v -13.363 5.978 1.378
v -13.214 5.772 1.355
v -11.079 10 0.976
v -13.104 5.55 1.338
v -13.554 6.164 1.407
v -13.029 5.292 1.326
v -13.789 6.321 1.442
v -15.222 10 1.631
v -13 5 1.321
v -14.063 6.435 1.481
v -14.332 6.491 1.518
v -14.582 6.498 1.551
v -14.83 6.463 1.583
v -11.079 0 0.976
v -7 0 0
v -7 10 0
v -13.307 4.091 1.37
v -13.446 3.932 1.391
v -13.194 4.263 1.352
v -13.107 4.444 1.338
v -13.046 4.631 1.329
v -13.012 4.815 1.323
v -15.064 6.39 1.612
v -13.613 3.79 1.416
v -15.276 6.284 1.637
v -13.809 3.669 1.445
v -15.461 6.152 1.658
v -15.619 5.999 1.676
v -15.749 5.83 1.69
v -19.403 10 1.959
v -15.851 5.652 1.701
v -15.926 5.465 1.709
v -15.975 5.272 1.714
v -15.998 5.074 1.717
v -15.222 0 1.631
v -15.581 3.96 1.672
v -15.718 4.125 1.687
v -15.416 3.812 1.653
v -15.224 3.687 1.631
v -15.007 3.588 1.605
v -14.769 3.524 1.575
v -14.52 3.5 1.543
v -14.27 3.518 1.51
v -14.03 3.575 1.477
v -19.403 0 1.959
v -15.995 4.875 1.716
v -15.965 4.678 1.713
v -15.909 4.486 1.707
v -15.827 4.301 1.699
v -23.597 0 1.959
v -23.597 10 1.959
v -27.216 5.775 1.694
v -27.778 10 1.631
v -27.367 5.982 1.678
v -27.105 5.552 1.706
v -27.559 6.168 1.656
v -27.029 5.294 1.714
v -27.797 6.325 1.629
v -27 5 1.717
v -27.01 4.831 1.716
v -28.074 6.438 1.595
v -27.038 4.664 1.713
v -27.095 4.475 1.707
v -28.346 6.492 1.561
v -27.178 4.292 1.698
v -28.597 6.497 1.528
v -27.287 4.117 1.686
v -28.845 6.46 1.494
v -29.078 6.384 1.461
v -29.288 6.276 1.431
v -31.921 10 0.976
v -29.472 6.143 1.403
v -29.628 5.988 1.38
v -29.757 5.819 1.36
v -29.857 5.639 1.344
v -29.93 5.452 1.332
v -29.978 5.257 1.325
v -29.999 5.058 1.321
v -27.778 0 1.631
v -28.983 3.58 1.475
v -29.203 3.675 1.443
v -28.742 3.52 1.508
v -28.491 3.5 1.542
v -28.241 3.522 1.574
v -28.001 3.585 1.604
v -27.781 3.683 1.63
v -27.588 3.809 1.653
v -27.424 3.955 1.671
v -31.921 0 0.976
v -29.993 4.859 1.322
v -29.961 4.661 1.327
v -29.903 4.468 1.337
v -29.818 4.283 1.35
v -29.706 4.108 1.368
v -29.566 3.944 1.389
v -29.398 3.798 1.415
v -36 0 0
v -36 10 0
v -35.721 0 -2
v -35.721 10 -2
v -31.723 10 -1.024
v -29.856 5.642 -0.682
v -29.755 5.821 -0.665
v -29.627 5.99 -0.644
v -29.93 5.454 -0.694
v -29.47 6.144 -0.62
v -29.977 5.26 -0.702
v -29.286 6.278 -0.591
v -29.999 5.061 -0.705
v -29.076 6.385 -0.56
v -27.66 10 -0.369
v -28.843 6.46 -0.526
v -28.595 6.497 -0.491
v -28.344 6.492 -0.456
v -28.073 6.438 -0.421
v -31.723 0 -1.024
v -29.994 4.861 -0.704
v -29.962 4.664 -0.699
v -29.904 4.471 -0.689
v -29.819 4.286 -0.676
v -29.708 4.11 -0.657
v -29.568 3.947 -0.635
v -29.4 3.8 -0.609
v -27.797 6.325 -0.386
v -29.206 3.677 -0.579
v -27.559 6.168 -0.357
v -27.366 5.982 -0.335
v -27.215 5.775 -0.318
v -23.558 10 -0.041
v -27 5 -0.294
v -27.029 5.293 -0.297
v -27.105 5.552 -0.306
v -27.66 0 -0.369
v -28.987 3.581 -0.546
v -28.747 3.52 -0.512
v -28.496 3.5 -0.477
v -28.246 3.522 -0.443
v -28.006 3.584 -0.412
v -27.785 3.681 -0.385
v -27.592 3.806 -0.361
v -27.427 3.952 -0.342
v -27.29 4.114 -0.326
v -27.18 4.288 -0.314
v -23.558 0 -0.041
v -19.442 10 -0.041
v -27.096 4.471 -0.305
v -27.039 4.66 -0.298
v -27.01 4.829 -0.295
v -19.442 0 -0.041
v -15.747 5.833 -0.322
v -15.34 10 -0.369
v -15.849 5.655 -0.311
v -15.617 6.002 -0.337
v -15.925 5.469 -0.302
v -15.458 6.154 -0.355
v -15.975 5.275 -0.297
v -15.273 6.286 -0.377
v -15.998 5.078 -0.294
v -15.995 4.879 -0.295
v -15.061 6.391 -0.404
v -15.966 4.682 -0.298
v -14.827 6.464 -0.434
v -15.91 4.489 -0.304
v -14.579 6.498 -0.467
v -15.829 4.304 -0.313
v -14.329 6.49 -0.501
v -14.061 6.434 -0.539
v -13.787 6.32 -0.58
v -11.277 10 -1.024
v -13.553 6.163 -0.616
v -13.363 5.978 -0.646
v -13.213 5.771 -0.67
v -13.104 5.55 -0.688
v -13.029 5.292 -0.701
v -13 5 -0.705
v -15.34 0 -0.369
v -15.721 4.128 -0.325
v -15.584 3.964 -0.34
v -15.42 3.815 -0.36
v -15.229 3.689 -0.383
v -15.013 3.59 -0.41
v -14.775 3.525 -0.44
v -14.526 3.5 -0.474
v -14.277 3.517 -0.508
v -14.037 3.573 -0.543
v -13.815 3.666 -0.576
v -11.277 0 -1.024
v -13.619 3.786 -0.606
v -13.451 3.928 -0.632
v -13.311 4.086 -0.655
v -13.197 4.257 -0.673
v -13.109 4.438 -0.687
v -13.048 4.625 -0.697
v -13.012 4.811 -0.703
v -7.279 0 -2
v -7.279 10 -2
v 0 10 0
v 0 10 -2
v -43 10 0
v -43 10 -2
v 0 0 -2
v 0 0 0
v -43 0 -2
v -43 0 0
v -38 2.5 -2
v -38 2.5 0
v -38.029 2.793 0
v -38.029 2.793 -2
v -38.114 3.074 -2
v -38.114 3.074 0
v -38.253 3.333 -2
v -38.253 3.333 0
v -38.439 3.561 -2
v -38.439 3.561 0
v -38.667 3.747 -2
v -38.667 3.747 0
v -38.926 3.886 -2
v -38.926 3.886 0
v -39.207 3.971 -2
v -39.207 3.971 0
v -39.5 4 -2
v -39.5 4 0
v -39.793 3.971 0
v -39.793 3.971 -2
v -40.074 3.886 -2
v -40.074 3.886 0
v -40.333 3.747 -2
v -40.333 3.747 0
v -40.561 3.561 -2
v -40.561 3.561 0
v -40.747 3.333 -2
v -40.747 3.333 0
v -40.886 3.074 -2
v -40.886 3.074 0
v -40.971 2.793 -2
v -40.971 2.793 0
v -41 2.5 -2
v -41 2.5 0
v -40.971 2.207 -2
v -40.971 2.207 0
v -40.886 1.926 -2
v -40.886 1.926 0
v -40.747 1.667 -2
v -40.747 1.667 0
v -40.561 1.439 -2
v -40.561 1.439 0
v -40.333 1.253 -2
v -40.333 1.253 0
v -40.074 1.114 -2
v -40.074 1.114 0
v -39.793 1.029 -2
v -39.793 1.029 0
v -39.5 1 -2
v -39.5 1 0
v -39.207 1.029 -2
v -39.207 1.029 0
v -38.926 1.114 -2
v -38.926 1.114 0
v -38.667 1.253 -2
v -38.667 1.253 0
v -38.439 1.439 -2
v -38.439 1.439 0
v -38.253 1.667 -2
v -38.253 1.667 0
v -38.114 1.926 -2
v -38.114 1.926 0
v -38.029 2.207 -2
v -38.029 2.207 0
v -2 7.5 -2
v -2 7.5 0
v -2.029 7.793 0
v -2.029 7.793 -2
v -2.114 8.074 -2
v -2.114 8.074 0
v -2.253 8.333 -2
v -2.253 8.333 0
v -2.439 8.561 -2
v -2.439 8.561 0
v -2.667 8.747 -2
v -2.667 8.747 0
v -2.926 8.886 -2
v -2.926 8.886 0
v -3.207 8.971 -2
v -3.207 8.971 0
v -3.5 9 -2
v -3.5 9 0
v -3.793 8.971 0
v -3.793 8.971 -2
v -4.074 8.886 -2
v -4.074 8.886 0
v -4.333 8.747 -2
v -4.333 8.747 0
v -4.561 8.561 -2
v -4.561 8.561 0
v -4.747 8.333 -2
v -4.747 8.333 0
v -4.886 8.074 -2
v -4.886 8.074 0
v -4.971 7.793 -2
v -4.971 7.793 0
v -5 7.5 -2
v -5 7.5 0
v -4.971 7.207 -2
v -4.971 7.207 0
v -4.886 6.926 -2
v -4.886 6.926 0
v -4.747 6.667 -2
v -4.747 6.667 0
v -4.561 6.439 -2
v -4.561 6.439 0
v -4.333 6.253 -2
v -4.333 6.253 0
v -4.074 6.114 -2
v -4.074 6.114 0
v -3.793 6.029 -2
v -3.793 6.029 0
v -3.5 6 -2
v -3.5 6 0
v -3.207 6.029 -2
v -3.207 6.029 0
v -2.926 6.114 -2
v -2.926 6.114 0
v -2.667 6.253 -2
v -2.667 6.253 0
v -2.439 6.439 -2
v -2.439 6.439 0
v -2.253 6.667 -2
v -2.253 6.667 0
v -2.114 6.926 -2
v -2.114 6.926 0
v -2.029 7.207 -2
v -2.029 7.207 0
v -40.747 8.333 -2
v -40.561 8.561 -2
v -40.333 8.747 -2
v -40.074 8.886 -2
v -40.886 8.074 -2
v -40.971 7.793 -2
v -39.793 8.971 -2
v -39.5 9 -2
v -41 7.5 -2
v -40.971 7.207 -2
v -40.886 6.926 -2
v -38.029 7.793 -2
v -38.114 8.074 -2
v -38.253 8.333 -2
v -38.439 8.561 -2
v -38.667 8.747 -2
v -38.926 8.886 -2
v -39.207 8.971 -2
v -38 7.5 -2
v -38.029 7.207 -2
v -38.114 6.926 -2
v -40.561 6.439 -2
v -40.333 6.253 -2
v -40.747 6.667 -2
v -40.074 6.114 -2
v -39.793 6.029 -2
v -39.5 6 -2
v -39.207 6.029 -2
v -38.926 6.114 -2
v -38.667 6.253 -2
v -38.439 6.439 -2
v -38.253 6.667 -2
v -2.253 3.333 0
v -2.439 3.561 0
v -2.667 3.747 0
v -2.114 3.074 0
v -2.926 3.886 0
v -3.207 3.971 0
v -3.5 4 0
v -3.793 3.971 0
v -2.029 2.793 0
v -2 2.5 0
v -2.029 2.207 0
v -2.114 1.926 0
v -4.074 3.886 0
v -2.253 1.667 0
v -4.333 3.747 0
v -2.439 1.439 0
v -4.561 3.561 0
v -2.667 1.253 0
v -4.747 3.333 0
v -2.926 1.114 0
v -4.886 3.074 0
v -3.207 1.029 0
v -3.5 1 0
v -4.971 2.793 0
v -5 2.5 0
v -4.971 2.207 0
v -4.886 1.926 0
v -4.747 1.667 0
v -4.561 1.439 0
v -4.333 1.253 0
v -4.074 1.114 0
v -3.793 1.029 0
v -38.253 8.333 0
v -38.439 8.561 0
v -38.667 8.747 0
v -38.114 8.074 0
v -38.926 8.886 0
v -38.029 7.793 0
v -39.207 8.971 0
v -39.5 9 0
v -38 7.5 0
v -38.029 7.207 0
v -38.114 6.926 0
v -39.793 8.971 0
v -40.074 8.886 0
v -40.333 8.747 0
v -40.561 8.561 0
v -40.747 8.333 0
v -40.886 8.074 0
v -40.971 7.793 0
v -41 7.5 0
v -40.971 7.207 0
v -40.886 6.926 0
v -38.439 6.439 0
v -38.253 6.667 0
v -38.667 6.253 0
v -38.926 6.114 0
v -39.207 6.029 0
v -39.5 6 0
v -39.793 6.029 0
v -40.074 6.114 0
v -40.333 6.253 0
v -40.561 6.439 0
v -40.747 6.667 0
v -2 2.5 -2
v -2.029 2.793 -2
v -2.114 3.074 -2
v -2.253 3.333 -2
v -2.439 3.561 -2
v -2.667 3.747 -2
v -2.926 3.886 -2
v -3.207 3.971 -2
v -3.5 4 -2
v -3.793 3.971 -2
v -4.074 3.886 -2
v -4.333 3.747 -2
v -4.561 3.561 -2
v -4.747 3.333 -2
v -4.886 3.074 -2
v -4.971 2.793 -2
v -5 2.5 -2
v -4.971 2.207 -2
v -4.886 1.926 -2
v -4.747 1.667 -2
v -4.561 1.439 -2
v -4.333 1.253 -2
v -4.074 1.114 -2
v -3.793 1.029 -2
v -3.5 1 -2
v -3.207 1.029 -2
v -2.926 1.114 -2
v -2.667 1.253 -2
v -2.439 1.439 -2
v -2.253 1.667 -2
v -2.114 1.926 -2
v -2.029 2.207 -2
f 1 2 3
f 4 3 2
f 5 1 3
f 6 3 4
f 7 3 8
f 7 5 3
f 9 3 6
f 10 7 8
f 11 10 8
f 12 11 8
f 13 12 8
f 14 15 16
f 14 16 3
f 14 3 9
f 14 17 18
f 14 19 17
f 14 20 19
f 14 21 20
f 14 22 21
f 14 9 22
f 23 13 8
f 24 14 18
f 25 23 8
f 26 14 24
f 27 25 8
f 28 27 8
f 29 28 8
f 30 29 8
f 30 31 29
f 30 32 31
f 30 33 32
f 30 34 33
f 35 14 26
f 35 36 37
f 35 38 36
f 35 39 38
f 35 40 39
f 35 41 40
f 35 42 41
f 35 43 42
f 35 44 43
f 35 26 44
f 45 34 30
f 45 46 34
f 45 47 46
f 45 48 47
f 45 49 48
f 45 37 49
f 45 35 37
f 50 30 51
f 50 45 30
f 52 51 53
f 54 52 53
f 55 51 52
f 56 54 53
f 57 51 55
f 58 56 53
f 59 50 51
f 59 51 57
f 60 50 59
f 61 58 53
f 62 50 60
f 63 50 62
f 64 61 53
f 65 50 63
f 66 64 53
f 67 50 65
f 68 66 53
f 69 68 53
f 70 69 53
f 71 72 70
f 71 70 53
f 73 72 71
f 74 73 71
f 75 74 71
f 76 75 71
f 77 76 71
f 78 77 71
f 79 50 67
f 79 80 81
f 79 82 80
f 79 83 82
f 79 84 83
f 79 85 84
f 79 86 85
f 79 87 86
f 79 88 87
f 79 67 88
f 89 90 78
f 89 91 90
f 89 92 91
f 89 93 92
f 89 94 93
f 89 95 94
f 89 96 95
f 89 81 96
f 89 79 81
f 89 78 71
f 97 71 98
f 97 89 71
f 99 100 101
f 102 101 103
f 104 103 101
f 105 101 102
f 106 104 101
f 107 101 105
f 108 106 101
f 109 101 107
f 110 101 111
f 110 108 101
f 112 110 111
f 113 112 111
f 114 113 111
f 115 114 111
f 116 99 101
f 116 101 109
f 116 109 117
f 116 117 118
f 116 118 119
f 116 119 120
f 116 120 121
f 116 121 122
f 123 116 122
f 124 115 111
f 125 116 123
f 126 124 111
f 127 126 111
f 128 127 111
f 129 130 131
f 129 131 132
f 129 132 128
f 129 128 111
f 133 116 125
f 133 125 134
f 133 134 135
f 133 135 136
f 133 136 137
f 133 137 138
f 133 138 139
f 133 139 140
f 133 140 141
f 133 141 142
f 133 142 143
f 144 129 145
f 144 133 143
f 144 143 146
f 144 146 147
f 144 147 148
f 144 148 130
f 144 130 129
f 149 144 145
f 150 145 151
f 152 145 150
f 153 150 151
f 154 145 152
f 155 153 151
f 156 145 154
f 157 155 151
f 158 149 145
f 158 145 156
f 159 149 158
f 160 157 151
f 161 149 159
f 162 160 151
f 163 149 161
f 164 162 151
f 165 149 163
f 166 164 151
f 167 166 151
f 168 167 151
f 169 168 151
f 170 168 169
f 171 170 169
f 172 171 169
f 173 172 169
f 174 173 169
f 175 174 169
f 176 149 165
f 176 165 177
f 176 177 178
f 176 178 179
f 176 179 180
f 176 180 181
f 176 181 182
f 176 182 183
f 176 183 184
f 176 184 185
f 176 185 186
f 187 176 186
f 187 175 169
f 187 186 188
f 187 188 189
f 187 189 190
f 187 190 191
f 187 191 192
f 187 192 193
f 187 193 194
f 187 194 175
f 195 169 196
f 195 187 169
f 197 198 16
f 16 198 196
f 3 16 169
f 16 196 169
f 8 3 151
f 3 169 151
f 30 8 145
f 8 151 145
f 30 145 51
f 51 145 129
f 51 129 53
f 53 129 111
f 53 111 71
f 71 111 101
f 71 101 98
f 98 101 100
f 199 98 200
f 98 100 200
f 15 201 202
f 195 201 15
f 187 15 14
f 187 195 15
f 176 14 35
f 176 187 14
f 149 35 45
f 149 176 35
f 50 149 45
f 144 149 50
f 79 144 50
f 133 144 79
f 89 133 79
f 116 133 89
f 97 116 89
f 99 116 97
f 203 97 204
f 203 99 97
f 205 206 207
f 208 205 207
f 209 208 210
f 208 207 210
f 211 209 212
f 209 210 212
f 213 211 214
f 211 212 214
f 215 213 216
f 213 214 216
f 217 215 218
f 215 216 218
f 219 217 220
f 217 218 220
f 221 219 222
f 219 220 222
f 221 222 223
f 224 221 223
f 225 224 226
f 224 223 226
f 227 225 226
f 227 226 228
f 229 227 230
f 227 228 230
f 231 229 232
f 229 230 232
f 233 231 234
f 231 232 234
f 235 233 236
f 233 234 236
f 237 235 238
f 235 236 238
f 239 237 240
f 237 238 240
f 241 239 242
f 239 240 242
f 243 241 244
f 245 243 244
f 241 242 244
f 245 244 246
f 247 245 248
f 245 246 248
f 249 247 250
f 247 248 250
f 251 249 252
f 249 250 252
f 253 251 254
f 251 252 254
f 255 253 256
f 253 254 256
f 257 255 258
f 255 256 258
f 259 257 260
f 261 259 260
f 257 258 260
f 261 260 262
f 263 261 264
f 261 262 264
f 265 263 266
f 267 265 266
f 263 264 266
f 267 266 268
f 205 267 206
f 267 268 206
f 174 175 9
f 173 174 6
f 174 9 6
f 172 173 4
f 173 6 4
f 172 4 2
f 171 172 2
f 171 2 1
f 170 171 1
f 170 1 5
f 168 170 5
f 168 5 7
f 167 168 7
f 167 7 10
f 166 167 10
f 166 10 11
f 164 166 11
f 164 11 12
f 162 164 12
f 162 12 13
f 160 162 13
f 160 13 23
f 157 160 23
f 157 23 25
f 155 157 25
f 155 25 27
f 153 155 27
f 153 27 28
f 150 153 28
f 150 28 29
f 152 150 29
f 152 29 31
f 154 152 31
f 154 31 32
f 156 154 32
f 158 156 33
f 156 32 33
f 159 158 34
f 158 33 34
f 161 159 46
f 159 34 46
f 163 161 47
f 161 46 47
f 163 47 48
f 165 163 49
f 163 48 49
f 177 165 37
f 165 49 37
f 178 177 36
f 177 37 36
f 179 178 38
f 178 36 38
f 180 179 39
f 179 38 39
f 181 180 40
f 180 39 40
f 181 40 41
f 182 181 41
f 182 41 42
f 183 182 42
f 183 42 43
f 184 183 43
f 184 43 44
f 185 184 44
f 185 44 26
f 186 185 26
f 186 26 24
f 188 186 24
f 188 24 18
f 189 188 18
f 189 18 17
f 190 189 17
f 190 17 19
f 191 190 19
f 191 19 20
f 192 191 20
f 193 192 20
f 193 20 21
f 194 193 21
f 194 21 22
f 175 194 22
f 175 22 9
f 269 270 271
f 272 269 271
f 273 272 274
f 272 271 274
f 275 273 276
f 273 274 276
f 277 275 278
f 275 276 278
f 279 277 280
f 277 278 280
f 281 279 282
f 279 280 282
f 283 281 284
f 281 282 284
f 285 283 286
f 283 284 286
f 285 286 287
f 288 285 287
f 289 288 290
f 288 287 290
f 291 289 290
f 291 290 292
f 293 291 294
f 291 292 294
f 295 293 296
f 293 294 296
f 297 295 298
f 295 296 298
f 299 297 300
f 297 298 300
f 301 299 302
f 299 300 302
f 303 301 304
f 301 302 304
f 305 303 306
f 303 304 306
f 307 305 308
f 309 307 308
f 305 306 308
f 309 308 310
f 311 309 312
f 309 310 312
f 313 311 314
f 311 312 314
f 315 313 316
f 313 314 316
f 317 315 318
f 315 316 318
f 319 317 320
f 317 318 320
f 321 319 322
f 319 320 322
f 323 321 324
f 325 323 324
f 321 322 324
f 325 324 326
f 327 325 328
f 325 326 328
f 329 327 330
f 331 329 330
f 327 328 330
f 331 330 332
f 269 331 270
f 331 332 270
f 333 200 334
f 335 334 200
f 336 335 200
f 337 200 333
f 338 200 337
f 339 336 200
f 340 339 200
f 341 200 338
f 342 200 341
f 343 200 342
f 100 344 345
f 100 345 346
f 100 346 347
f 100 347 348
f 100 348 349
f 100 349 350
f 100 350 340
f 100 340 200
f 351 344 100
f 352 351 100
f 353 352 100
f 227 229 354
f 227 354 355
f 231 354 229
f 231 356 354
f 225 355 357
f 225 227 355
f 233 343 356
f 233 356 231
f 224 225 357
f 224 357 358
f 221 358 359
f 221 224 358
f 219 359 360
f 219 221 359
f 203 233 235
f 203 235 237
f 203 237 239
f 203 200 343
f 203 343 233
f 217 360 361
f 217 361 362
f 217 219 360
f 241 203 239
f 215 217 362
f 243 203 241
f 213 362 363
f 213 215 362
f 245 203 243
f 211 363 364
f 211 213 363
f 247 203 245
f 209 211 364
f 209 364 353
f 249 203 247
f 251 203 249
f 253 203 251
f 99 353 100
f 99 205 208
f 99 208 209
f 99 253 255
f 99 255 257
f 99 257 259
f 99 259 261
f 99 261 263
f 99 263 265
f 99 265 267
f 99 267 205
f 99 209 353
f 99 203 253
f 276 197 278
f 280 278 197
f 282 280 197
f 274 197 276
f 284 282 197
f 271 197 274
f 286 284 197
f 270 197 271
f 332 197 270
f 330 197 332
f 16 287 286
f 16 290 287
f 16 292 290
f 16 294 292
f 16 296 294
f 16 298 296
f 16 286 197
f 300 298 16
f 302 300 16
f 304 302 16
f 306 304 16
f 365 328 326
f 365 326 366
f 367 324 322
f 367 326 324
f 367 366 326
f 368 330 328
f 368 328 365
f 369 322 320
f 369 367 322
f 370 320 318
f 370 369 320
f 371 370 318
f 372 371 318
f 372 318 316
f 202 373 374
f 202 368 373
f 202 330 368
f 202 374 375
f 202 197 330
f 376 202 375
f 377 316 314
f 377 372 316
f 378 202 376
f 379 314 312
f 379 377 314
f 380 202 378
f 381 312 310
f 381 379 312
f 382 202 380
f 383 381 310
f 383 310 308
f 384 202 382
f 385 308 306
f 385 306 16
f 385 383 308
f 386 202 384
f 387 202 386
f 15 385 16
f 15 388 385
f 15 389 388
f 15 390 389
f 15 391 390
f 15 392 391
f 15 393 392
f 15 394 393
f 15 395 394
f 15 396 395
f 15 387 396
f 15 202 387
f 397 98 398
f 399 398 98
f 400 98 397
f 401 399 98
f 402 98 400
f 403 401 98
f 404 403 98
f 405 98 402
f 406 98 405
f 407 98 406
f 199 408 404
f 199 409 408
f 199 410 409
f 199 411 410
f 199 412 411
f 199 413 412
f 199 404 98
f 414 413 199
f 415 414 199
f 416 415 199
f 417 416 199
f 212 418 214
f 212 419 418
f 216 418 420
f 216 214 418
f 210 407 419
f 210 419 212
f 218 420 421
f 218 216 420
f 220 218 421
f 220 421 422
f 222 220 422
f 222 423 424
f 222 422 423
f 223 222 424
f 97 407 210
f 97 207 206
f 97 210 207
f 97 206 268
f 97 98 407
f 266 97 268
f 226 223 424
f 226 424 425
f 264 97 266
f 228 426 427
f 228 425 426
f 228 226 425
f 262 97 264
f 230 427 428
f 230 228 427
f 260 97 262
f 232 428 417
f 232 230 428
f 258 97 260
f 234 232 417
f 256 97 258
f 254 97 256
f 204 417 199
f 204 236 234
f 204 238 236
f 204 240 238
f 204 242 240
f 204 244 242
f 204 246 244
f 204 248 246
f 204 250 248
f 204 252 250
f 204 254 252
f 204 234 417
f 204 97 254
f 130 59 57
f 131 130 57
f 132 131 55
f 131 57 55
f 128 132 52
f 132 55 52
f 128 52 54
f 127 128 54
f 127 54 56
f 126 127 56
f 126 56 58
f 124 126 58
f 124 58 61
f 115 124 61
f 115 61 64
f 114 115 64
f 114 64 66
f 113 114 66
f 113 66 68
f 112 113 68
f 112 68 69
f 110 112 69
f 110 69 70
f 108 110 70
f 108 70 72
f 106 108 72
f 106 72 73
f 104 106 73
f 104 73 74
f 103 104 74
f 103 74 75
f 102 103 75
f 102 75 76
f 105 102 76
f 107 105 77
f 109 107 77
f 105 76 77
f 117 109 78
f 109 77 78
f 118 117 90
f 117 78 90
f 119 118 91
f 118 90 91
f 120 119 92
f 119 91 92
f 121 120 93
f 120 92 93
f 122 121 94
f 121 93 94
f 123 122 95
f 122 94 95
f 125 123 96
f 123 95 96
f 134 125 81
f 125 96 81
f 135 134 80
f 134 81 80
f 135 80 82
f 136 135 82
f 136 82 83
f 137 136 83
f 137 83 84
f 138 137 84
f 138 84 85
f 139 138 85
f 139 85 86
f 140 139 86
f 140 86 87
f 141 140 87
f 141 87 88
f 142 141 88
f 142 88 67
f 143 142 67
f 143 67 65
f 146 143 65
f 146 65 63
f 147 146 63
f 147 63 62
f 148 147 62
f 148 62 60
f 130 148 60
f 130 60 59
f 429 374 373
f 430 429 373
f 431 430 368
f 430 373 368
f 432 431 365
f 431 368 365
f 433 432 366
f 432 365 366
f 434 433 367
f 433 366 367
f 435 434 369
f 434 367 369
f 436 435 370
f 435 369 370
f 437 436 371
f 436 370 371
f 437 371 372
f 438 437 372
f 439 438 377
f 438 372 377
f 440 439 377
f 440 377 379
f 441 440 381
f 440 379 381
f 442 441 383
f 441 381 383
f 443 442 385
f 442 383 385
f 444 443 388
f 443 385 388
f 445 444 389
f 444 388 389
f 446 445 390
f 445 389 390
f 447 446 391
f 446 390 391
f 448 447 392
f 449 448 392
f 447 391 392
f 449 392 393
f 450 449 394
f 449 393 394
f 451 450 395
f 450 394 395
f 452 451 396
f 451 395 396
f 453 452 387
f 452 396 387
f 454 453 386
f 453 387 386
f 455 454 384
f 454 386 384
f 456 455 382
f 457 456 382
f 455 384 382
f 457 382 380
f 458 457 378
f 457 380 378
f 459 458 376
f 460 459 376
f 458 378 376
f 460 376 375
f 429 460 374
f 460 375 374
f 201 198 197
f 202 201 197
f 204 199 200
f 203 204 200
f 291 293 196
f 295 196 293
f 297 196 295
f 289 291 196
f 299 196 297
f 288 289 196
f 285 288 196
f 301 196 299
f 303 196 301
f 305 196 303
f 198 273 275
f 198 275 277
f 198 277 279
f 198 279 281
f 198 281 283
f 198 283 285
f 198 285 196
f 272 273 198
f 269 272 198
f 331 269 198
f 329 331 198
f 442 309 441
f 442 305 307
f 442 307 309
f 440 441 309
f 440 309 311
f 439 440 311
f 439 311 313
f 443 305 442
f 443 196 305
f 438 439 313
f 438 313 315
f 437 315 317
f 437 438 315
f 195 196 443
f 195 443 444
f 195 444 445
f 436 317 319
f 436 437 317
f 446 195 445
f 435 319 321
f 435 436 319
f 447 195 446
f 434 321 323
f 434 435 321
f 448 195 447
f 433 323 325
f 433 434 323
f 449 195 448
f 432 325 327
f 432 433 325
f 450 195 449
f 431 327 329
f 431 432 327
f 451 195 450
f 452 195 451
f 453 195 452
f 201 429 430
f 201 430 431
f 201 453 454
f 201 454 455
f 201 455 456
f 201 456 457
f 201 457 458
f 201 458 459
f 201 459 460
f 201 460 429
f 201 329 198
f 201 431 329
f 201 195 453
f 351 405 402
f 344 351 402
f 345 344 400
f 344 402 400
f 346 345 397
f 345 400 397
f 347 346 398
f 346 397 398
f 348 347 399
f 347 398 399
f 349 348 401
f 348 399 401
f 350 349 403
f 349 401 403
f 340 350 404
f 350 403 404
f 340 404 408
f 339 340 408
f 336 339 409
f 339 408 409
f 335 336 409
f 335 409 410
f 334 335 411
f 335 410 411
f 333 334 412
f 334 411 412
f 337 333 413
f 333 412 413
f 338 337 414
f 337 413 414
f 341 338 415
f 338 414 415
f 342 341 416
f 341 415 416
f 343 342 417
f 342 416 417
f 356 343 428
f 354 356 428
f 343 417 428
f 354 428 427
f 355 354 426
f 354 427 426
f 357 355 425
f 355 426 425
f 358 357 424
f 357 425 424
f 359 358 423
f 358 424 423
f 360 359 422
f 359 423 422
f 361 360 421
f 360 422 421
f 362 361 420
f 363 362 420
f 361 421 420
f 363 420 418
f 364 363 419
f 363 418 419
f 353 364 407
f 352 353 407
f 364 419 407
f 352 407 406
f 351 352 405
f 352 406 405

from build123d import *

# Parameters (mm, degrees)
EXTRUDE_1_DEPTH     = 10
SKETCH_2_R          = 1.5
CUT_EXTRUDE_1_DEPTH = 2
SKETCH_4_R          = 1.5
CUT_EXTRUDE_3_DEPTH = 3


with BuildPart() as part:
    # Эскиз1 → Вытянуть-Тонкостенный1 (new body)
    with BuildSketch(Plane(origin=(0, 0, 0), x_dir=(1, 0, 0), z_dir=(0, 1, 0))):
        with BuildLine():
            Line((0, 0), (-7, 0))
            ThreePointArc((-7, 0), (-21.5, -2), (-36, 0))
            Line((-36, 0), (-43, 0))
            Line((-43, 0), (-43, 2))
            Line((-43, 2), (-35.721462653, 2))
            ThreePointArc((-35.721462653, 2), (-21.5, 0), (-7.278537347, 2))
            Line((-7.278537347, 2), (0, 2))
            Line((0, 2), (0, 0))
        make_face()
    extrude(amount=EXTRUDE_1_DEPTH)

    # Эскиз2 → Вырез-Вытянуть1 (cut)
    with BuildSketch(Plane.XY):
        with Locations((-39.5, 7.5)):
            Circle(SKETCH_2_R)
        with Locations((-39.5, 2.5)):
            Circle(SKETCH_2_R)
        with Locations((-3.5, 7.5)):
            Circle(SKETCH_2_R)
        with Locations((-3.5, 2.5)):
            Circle(SKETCH_2_R)
    extrude(amount=-CUT_EXTRUDE_1_DEPTH, mode=Mode.SUBTRACT)

    # Эскиз4 → Вырез-Вытянуть3 (cut)
    with BuildSketch(Plane.XY.offset(2)):
        with Locations((-28.5, 5)):
            Circle(SKETCH_4_R)
        with Locations((-14.5, 5)):
            Circle(SKETCH_4_R)
    extrude(amount=-CUT_EXTRUDE_3_DEPTH, mode=Mode.SUBTRACT)


solid = part.part
